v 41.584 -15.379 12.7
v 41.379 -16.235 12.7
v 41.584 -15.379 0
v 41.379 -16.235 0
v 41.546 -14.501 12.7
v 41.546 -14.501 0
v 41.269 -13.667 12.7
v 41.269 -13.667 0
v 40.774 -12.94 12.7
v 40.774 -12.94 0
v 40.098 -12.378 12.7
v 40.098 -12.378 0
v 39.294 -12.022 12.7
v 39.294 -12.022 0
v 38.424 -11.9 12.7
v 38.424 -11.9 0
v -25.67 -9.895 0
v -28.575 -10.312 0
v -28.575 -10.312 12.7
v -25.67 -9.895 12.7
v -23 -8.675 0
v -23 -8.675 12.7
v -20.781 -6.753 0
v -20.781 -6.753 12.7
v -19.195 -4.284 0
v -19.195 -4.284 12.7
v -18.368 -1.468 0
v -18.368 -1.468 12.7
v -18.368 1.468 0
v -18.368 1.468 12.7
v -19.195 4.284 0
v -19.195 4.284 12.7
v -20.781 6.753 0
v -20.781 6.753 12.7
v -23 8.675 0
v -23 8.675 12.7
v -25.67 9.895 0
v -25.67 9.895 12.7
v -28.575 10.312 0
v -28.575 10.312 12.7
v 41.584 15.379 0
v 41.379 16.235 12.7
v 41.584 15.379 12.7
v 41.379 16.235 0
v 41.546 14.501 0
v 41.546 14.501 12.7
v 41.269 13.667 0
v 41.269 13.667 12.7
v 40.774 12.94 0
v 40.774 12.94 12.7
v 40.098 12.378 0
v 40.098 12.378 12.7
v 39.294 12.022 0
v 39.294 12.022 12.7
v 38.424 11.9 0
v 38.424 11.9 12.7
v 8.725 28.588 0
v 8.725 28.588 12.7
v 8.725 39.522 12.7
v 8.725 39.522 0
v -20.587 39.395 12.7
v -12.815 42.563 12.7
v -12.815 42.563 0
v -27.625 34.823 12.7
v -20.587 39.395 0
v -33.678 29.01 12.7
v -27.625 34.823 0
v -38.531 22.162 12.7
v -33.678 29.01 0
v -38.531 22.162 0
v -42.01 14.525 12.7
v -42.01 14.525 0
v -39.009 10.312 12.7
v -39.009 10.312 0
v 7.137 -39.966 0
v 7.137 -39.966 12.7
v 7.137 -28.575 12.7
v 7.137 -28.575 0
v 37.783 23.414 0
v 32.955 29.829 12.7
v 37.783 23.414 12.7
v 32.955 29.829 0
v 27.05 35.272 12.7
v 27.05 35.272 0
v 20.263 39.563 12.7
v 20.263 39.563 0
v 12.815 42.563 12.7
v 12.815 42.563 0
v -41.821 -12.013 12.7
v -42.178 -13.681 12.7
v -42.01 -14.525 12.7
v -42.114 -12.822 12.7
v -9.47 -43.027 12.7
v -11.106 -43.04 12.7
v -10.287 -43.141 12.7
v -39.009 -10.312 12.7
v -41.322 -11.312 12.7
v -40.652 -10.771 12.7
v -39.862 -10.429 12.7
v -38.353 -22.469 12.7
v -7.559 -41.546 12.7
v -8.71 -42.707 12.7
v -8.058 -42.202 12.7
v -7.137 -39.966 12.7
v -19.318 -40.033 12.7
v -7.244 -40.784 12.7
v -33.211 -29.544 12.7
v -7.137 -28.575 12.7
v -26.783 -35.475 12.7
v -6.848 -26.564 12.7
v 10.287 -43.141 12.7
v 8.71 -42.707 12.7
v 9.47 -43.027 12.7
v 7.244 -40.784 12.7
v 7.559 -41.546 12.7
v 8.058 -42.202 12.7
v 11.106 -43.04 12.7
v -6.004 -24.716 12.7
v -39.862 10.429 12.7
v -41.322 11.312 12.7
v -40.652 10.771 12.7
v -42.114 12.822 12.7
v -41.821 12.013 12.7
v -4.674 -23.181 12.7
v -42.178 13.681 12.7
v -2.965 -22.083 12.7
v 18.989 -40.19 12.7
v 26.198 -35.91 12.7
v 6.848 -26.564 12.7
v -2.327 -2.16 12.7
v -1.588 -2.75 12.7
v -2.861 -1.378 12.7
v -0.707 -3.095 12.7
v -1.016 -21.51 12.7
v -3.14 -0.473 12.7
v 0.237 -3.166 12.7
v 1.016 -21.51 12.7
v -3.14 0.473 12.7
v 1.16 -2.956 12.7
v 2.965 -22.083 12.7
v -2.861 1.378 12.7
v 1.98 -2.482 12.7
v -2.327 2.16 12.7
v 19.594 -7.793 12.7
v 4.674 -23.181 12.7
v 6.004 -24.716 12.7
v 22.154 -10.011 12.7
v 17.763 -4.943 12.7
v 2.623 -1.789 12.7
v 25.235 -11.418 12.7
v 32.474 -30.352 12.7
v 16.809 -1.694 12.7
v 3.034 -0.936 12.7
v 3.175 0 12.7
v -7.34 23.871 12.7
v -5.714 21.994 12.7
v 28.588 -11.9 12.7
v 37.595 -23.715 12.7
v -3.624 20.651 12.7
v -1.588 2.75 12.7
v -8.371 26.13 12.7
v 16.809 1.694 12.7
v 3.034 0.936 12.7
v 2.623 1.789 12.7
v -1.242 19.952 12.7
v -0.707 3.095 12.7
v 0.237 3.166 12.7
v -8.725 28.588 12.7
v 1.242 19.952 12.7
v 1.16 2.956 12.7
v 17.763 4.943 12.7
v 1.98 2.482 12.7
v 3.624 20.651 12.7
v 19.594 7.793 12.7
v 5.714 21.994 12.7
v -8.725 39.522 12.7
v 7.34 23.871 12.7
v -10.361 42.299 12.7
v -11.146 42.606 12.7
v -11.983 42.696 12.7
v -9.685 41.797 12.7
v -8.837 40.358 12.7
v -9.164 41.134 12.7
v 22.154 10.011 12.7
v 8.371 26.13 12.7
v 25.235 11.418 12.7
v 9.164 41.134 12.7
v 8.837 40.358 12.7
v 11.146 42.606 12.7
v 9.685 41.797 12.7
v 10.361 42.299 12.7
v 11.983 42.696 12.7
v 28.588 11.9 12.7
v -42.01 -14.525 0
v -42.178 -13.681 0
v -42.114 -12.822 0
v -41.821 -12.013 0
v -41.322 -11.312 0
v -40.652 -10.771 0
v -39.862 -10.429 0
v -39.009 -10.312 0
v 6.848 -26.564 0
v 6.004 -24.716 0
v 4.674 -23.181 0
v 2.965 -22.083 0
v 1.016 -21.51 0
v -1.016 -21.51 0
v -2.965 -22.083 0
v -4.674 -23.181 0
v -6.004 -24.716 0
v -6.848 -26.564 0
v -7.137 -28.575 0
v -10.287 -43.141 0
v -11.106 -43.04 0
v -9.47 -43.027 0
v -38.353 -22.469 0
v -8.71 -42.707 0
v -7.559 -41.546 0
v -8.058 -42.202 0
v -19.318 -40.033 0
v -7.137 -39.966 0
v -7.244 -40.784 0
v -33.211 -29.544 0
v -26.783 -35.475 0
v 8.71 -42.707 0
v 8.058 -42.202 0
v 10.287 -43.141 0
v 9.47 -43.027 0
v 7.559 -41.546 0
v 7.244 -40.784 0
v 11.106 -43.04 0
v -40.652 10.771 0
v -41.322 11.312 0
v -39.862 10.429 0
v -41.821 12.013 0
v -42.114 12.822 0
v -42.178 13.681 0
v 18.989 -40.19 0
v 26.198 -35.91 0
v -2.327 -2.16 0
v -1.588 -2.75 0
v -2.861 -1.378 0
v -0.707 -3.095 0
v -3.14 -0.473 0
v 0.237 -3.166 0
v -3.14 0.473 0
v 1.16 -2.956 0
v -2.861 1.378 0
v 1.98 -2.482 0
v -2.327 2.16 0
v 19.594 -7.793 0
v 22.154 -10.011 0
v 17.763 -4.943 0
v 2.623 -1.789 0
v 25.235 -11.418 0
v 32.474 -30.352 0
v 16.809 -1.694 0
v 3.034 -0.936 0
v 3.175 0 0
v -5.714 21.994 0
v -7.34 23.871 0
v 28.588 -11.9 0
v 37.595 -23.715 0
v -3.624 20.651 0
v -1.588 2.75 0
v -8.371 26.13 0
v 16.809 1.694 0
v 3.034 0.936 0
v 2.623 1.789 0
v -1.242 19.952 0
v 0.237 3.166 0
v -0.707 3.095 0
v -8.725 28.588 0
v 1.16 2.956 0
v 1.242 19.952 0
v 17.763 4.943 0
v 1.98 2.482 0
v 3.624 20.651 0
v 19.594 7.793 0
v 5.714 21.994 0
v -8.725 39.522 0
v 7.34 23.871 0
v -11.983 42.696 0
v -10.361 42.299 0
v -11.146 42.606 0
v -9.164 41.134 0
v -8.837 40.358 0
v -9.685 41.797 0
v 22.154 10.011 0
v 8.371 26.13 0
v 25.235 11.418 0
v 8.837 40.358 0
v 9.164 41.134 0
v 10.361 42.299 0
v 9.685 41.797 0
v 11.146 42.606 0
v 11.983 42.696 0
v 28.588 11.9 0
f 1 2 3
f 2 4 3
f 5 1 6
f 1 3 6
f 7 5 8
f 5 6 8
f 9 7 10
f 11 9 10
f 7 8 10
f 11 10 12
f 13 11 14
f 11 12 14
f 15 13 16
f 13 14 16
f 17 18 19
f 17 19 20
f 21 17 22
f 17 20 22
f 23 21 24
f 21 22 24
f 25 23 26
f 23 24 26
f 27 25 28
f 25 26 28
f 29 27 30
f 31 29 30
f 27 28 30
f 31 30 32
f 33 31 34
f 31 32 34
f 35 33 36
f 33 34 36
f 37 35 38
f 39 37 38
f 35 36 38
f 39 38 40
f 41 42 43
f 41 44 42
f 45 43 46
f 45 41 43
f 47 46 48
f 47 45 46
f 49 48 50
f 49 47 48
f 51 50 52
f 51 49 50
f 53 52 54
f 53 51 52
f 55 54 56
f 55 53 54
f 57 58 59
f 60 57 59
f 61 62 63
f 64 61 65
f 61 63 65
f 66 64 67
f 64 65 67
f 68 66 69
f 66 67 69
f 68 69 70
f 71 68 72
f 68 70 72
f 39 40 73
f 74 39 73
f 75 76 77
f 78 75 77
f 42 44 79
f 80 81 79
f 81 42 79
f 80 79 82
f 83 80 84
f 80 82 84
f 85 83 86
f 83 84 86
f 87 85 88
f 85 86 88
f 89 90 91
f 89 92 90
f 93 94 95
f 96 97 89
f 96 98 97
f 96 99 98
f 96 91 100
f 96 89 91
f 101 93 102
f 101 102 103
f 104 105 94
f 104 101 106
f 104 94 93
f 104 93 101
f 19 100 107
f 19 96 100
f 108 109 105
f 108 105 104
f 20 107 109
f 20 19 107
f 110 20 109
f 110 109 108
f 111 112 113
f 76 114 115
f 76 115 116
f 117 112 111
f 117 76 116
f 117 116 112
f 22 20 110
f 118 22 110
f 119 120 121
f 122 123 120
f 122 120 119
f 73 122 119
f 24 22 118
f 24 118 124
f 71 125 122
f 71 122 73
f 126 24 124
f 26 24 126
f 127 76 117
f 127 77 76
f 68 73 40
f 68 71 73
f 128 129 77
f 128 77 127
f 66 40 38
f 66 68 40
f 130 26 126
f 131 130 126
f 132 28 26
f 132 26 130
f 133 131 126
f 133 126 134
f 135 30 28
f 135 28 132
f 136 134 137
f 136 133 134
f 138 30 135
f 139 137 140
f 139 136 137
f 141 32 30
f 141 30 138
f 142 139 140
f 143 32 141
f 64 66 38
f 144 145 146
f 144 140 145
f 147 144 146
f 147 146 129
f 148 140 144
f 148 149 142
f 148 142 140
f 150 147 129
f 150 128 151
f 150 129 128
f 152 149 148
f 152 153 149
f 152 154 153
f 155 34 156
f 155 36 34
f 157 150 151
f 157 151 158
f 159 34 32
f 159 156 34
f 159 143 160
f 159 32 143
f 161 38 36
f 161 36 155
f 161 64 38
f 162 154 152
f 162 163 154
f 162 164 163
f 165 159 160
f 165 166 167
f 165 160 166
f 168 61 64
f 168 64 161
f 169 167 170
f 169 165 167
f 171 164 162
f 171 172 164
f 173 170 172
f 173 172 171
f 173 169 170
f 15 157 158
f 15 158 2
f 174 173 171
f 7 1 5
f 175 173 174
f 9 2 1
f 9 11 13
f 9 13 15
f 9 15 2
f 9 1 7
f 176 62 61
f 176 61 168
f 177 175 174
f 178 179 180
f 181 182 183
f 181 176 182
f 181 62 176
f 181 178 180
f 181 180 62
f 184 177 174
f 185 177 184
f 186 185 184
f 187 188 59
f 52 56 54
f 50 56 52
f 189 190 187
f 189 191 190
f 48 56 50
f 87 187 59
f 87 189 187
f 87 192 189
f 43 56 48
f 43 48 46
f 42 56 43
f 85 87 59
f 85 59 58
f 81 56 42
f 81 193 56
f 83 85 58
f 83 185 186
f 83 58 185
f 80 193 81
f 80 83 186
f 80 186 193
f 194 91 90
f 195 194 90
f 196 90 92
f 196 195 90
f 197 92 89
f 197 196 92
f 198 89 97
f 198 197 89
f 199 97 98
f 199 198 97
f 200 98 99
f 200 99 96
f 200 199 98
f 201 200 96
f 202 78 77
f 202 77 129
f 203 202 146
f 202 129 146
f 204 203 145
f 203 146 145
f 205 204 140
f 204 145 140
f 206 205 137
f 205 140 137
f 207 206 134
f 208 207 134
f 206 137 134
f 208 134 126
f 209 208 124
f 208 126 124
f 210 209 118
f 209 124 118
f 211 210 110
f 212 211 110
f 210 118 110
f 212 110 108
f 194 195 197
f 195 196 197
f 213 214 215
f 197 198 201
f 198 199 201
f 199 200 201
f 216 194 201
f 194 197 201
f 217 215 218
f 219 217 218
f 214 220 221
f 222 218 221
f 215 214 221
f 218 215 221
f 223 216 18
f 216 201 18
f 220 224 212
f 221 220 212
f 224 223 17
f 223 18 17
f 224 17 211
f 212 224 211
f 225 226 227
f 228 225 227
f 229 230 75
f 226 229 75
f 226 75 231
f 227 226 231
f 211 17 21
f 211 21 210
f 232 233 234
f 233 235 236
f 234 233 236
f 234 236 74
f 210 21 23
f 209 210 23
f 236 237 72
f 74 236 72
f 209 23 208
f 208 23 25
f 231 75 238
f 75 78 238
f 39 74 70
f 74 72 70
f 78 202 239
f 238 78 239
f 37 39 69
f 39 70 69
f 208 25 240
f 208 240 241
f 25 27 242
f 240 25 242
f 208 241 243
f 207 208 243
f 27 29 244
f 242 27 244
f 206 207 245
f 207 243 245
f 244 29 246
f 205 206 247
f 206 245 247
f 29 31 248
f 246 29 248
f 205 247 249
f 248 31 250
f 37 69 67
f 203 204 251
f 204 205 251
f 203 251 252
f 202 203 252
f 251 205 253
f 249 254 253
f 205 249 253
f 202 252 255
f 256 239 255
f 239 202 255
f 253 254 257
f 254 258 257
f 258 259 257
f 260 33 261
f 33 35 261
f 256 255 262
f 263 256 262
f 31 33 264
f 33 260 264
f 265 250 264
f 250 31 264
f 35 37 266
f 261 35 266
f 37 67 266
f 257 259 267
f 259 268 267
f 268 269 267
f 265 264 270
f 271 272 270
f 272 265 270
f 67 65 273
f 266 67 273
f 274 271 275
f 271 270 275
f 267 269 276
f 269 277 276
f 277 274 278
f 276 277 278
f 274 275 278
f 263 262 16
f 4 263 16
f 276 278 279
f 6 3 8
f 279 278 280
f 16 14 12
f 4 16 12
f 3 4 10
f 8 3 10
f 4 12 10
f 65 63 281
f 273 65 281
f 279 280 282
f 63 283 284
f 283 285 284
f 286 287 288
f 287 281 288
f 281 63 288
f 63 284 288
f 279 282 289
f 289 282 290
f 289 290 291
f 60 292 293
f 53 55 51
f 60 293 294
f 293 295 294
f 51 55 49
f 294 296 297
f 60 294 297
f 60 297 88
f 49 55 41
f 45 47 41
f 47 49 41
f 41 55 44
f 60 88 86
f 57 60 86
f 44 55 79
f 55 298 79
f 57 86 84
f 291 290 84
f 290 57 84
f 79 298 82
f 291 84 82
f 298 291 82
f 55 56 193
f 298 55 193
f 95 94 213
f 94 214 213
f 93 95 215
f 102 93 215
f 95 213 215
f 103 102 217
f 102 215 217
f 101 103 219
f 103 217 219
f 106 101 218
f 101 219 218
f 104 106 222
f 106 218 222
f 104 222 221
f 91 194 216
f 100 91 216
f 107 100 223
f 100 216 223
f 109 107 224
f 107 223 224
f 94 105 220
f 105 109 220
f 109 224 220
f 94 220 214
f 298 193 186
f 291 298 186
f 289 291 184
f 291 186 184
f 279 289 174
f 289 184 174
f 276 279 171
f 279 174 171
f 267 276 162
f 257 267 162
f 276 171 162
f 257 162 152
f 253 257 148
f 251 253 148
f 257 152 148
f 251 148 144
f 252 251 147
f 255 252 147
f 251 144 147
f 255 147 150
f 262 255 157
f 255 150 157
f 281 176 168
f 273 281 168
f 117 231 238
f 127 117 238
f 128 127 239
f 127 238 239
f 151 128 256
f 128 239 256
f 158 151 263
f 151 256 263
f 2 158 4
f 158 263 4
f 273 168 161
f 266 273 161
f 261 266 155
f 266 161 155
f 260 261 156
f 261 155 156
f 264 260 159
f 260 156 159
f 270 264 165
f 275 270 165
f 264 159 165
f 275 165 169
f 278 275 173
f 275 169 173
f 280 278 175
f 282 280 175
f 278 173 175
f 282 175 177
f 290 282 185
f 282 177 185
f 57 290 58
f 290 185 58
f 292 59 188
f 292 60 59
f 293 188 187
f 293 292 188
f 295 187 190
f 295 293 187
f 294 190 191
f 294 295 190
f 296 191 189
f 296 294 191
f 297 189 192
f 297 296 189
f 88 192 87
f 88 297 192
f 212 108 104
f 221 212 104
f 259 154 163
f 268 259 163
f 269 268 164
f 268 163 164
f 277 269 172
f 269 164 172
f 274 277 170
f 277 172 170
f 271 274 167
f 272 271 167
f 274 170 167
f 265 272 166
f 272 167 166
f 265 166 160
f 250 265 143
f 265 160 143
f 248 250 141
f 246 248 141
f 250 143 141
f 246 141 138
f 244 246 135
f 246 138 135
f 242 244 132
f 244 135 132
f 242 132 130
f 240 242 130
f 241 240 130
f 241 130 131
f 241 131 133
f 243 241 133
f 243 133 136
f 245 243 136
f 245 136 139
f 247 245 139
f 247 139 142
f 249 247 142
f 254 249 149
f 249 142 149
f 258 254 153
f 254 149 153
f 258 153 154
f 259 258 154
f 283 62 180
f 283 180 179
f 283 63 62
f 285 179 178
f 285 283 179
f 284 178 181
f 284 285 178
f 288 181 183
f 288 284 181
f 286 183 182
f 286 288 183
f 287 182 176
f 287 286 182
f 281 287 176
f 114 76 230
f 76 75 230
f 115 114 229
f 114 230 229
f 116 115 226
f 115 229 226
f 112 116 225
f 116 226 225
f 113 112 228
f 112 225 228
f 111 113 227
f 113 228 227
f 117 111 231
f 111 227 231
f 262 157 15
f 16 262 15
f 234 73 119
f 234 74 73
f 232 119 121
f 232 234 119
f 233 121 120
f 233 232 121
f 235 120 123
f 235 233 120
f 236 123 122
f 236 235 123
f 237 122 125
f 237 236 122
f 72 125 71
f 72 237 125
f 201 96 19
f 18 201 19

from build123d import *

# Parameters (mm, degrees)
F0_R      = 44.45
F1_DEPTH  = 12.7
F3_DEPTH  = 12.7
F5_DEPTH  = 12.7
F7_DEPTH  = 25.4
F9_DEPTH  = 12.7
F10_R     = 3.175
F11_DEPTH = 12.7
F12_R     = 3.175


with BuildPart() as f1:
    # F0 (on Top) → F1 (new body)
    with BuildSketch(Plane.XY):
        Circle(F0_R)
    extrude(amount=F1_DEPTH)

    # F2 (on face) → F3 (cut)
    with BuildSketch(Plane.XY.offset(12.7)):
        with BuildLine():
            ThreePointArc((-28.575, -10.3124), (-18.2626, 0), (-28.575, 10.3124))
            Line((-28.575, 10.3124), (-43.2372166801, 10.3124))
            ThreePointArc((-43.2372166801, 10.3124), (-44.45, 0), (-43.2372166801, -10.3124))
            Line((-43.2372166801, -10.3124), (-28.575, -10.3124))
        make_face()
    extrude(amount=-F3_DEPTH, mode=Mode.SUBTRACT)

    # F4 (on face) → F5 (cut)
    with BuildSketch(Plane.XY.offset(12.7)):
        with BuildLine():
            Line((42.8275014446, 11.8999), (28.5877, 11.8999))
            ThreePointArc((28.5877, 11.8999), (16.6878, 0), (28.5877, -11.8999))
            Line((28.5877, -11.8999), (42.8275014446, -11.8999))
            ThreePointArc((42.8275014446, -11.8999), (44.45, 0), (42.8275014446, 11.8999))
        make_face()
    extrude(amount=-F5_DEPTH, mode=Mode.SUBTRACT)

    # F6 (on face) → F7 (cut)
    with BuildSketch(Plane.XY.offset(12.7)):
        with BuildLine():
            Line((-8.7249, 43.585302798), (-8.7249, 28.5877))
            ThreePointArc((-8.7249, 28.5877), (0, 19.8628), (8.7249, 28.5877))
            Line((8.7249, 28.5877), (8.7249, 43.585302798))
            ThreePointArc((8.7249, 43.585302798), (0, 44.45), (-8.7249, 43.585302798))
        make_face()
    extrude(amount=-F7_DEPTH, mode=Mode.SUBTRACT)

    # F8 (on face) → F9 (cut)
    with BuildSketch(Plane.XY.offset(12.7)):
        with BuildLine():
            ThreePointArc((7.1374, -28.575), (0, -21.4376), (-7.1374, -28.575))
            Line((-7.1374, -28.575), (-7.1374, -43.8732267019))
            ThreePointArc((-7.1374, -43.8732267019), (0, -44.45), (7.1374, -43.8732267019))
            Line((7.1374, -43.8732267019), (7.1374, -28.575))
        make_face()
    extrude(amount=-F9_DEPTH, mode=Mode.SUBTRACT)

    # F10 (on face) → F11 (cut, through all)
    with BuildSketch(Plane.XY.offset(12.7)):
        Circle(F10_R)
    extrude(amount=-F11_DEPTH, mode=Mode.SUBTRACT)

    # F12
    f12_edges = [f1.edges().sort_by_distance(p)[0] for p in [
        (42.827501, -11.8999, 6.35),
        (42.827501, 11.8999, 6.35),
        (8.7249, 43.585303, 6.35),
        (-8.7249, 43.585303, 6.35),
        (7.1374, -43.873227, 6.35),
        (-7.1374, -43.873227, 6.35),
        (-43.237217, -10.3124, 6.35),
        (-43.237217, 10.3124, 6.35),
    ]]
    fillet(f12_edges, radius=F12_R)


solid = f1.part
